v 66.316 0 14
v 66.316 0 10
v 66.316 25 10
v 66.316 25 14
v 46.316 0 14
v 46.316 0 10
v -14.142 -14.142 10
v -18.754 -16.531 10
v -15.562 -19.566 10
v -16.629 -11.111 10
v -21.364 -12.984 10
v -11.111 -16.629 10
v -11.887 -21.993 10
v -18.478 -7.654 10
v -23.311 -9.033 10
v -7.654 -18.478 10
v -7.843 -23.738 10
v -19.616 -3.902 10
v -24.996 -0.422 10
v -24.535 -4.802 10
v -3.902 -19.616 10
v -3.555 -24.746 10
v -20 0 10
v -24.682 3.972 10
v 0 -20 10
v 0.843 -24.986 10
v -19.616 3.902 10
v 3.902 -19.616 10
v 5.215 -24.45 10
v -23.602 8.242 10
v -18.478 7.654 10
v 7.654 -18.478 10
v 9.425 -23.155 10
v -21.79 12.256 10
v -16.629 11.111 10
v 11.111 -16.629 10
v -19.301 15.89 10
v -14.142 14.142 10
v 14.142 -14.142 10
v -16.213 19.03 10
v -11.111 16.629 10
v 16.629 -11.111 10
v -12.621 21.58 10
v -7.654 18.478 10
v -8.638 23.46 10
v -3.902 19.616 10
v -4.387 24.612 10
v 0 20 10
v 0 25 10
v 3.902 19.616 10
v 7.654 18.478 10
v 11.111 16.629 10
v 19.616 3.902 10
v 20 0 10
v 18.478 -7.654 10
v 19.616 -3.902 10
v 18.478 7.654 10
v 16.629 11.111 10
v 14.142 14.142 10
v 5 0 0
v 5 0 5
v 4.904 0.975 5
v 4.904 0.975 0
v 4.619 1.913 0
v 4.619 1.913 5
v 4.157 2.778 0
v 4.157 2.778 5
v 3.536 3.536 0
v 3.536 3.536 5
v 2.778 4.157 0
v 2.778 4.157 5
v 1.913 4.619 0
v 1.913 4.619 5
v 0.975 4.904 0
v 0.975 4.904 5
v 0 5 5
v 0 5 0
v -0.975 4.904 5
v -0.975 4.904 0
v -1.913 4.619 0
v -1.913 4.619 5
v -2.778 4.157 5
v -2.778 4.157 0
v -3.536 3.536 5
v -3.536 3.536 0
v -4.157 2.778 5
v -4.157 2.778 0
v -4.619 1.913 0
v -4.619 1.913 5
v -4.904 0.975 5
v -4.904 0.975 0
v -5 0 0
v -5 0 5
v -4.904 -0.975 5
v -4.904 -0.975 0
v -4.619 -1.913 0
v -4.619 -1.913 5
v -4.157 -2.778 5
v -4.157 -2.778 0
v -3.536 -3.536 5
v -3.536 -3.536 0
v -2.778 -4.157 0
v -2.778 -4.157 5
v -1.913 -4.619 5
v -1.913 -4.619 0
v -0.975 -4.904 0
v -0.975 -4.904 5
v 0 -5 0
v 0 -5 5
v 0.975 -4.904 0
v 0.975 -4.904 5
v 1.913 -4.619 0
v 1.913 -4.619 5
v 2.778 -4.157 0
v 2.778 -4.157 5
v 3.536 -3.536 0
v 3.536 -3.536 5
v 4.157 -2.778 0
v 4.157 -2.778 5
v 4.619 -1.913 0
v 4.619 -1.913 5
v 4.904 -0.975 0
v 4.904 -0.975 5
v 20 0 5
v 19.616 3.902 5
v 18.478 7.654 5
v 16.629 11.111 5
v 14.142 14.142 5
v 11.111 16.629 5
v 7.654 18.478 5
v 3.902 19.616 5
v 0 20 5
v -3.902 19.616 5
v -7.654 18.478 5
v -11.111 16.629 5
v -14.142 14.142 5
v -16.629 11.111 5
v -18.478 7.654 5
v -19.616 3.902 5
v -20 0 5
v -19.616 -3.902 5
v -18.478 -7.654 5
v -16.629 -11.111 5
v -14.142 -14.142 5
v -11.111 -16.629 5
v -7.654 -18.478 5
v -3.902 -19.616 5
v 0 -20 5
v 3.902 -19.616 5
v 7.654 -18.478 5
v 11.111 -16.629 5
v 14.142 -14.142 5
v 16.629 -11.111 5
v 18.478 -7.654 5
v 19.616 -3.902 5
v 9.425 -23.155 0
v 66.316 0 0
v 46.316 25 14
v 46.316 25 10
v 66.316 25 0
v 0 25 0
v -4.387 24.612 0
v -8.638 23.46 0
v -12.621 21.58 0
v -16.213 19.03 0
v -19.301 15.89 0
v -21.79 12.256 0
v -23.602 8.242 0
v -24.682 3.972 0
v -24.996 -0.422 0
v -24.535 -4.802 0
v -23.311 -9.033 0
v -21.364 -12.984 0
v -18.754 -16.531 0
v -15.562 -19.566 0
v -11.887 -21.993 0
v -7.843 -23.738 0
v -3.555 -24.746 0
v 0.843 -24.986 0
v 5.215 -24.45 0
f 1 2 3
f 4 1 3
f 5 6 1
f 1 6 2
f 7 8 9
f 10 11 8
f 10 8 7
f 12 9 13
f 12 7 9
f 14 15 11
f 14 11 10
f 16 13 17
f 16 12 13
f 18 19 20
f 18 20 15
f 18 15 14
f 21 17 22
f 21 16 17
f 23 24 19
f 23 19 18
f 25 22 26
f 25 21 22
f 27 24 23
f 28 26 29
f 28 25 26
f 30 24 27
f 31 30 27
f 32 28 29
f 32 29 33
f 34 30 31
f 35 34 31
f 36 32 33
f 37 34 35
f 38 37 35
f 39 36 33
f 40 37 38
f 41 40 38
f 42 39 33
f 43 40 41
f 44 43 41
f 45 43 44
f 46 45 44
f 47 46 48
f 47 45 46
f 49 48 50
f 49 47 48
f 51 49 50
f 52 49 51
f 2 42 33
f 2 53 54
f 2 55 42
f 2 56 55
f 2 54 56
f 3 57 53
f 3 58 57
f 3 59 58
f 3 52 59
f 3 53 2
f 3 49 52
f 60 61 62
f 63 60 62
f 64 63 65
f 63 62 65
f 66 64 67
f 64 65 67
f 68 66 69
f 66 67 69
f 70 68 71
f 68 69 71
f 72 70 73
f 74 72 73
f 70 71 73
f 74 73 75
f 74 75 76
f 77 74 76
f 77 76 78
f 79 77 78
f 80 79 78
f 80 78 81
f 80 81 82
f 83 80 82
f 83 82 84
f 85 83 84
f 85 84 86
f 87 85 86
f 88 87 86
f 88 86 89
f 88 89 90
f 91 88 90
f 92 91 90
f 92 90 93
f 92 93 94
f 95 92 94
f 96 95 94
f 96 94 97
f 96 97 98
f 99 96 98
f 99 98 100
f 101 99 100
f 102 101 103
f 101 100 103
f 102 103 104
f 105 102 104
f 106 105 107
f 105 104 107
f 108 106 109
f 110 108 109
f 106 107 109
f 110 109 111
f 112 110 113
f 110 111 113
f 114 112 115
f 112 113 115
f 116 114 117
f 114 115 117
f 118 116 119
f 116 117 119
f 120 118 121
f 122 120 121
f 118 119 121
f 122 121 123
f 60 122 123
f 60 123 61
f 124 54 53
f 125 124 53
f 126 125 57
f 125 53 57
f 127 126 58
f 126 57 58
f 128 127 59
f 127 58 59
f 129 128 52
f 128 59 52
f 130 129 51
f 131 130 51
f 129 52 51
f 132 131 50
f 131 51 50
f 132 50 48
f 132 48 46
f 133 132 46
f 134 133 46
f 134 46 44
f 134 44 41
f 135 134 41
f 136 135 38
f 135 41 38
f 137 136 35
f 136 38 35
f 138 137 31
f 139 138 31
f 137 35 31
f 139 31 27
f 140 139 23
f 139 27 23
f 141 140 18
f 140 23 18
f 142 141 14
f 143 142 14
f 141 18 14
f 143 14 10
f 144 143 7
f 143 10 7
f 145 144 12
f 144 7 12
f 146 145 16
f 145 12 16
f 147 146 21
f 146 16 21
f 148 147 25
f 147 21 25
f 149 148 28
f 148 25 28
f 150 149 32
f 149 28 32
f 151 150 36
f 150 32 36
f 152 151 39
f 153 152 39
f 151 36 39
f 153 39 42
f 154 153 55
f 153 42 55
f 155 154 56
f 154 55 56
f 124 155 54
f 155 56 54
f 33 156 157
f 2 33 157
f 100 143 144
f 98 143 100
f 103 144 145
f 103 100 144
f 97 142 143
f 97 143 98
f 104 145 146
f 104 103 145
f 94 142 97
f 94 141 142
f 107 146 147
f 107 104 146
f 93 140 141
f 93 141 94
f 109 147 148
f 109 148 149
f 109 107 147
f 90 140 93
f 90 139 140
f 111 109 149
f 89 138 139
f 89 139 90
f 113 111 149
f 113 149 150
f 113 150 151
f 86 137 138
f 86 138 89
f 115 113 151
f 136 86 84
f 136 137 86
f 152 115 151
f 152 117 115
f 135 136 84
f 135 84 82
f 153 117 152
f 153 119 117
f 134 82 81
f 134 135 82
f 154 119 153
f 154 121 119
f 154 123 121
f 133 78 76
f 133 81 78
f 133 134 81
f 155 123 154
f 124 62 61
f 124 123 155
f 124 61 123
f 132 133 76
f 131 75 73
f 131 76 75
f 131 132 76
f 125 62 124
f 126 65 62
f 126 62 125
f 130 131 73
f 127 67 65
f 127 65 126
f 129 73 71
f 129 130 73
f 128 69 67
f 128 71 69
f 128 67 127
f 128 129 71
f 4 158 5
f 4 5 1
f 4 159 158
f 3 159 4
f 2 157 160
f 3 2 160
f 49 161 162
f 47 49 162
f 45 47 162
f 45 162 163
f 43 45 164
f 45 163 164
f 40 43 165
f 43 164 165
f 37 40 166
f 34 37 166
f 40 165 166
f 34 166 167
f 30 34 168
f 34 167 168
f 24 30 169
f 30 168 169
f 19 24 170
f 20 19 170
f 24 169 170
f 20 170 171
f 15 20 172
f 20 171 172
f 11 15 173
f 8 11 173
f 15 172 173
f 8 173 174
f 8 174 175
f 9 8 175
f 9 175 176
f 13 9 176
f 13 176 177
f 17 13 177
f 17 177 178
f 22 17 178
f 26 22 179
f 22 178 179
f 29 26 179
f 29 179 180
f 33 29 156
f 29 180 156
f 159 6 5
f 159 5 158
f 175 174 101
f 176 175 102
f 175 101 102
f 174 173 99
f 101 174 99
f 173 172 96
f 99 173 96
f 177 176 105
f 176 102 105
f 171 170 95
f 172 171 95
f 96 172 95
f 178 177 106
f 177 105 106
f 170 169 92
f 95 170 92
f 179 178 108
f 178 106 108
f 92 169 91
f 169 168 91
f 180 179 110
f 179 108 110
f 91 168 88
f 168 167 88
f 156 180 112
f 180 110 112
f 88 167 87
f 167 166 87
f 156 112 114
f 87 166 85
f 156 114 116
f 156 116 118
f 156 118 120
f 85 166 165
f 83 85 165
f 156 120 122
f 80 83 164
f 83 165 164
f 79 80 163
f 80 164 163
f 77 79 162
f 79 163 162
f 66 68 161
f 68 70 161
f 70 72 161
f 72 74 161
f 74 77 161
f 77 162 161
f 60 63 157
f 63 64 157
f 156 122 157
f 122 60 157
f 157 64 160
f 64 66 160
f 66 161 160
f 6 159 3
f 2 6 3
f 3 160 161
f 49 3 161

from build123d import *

# Parameters (mm, degrees)
F1_DEPTH = 10
F2_R     = 20
F3_DEPTH = 5
F4_R     = 5
F5_DEPTH = 25
F6_W     = 20
F6_H     = 25
F7_DEPTH = 4


with BuildPart() as f1:
    # F0 (on Top) → F1 (new body)
    with BuildSketch(Plane.XY):
        with BuildLine():
            ThreePointArc((9.424603, -23.155493), (20.743855, -13.953224), (25, 0))
            ThreePointArc((25, 0), (17.67767, 17.67767), (0, 25))
            ThreePointArc((0, 25), (-24.53454, -4.801701), (9.424603, -23.155493))
        make_face()
        with BuildLine():
            ThreePointArc((0, 25), (17.67767, 17.67767), (25, 0))
            ThreePointArc((25, 0), (20.743855, -13.953224), (9.424603, -23.155493))
            Line((9.424603, -23.155493), (66.315793, 0))
            Line((66.315793, 0), (66.315793, 25))
            Line((66.315793, 25), (0, 25))
        make_face()
    extrude(amount=F1_DEPTH)

    # F2 (on face) → F3 (cut)
    with BuildSketch(Plane.XY.offset(10)):
        Circle(F2_R)
    extrude(amount=-F3_DEPTH, mode=Mode.SUBTRACT)

    # F4 (on face) → F5 (cut)
    with BuildSketch(Plane.XY.offset(5)):
        Circle(F4_R)
    extrude(amount=-F5_DEPTH, mode=Mode.SUBTRACT)


with BuildPart() as f7:
    # F6 (on face) → F7 (new body)
    with BuildSketch(Plane.XY.offset(10)):
        with Locations((56.315793, 12.5)):
            Rectangle(F6_W, F6_H)
    extrude(amount=F7_DEPTH)


solid = Compound([f1.part, f7.part])
